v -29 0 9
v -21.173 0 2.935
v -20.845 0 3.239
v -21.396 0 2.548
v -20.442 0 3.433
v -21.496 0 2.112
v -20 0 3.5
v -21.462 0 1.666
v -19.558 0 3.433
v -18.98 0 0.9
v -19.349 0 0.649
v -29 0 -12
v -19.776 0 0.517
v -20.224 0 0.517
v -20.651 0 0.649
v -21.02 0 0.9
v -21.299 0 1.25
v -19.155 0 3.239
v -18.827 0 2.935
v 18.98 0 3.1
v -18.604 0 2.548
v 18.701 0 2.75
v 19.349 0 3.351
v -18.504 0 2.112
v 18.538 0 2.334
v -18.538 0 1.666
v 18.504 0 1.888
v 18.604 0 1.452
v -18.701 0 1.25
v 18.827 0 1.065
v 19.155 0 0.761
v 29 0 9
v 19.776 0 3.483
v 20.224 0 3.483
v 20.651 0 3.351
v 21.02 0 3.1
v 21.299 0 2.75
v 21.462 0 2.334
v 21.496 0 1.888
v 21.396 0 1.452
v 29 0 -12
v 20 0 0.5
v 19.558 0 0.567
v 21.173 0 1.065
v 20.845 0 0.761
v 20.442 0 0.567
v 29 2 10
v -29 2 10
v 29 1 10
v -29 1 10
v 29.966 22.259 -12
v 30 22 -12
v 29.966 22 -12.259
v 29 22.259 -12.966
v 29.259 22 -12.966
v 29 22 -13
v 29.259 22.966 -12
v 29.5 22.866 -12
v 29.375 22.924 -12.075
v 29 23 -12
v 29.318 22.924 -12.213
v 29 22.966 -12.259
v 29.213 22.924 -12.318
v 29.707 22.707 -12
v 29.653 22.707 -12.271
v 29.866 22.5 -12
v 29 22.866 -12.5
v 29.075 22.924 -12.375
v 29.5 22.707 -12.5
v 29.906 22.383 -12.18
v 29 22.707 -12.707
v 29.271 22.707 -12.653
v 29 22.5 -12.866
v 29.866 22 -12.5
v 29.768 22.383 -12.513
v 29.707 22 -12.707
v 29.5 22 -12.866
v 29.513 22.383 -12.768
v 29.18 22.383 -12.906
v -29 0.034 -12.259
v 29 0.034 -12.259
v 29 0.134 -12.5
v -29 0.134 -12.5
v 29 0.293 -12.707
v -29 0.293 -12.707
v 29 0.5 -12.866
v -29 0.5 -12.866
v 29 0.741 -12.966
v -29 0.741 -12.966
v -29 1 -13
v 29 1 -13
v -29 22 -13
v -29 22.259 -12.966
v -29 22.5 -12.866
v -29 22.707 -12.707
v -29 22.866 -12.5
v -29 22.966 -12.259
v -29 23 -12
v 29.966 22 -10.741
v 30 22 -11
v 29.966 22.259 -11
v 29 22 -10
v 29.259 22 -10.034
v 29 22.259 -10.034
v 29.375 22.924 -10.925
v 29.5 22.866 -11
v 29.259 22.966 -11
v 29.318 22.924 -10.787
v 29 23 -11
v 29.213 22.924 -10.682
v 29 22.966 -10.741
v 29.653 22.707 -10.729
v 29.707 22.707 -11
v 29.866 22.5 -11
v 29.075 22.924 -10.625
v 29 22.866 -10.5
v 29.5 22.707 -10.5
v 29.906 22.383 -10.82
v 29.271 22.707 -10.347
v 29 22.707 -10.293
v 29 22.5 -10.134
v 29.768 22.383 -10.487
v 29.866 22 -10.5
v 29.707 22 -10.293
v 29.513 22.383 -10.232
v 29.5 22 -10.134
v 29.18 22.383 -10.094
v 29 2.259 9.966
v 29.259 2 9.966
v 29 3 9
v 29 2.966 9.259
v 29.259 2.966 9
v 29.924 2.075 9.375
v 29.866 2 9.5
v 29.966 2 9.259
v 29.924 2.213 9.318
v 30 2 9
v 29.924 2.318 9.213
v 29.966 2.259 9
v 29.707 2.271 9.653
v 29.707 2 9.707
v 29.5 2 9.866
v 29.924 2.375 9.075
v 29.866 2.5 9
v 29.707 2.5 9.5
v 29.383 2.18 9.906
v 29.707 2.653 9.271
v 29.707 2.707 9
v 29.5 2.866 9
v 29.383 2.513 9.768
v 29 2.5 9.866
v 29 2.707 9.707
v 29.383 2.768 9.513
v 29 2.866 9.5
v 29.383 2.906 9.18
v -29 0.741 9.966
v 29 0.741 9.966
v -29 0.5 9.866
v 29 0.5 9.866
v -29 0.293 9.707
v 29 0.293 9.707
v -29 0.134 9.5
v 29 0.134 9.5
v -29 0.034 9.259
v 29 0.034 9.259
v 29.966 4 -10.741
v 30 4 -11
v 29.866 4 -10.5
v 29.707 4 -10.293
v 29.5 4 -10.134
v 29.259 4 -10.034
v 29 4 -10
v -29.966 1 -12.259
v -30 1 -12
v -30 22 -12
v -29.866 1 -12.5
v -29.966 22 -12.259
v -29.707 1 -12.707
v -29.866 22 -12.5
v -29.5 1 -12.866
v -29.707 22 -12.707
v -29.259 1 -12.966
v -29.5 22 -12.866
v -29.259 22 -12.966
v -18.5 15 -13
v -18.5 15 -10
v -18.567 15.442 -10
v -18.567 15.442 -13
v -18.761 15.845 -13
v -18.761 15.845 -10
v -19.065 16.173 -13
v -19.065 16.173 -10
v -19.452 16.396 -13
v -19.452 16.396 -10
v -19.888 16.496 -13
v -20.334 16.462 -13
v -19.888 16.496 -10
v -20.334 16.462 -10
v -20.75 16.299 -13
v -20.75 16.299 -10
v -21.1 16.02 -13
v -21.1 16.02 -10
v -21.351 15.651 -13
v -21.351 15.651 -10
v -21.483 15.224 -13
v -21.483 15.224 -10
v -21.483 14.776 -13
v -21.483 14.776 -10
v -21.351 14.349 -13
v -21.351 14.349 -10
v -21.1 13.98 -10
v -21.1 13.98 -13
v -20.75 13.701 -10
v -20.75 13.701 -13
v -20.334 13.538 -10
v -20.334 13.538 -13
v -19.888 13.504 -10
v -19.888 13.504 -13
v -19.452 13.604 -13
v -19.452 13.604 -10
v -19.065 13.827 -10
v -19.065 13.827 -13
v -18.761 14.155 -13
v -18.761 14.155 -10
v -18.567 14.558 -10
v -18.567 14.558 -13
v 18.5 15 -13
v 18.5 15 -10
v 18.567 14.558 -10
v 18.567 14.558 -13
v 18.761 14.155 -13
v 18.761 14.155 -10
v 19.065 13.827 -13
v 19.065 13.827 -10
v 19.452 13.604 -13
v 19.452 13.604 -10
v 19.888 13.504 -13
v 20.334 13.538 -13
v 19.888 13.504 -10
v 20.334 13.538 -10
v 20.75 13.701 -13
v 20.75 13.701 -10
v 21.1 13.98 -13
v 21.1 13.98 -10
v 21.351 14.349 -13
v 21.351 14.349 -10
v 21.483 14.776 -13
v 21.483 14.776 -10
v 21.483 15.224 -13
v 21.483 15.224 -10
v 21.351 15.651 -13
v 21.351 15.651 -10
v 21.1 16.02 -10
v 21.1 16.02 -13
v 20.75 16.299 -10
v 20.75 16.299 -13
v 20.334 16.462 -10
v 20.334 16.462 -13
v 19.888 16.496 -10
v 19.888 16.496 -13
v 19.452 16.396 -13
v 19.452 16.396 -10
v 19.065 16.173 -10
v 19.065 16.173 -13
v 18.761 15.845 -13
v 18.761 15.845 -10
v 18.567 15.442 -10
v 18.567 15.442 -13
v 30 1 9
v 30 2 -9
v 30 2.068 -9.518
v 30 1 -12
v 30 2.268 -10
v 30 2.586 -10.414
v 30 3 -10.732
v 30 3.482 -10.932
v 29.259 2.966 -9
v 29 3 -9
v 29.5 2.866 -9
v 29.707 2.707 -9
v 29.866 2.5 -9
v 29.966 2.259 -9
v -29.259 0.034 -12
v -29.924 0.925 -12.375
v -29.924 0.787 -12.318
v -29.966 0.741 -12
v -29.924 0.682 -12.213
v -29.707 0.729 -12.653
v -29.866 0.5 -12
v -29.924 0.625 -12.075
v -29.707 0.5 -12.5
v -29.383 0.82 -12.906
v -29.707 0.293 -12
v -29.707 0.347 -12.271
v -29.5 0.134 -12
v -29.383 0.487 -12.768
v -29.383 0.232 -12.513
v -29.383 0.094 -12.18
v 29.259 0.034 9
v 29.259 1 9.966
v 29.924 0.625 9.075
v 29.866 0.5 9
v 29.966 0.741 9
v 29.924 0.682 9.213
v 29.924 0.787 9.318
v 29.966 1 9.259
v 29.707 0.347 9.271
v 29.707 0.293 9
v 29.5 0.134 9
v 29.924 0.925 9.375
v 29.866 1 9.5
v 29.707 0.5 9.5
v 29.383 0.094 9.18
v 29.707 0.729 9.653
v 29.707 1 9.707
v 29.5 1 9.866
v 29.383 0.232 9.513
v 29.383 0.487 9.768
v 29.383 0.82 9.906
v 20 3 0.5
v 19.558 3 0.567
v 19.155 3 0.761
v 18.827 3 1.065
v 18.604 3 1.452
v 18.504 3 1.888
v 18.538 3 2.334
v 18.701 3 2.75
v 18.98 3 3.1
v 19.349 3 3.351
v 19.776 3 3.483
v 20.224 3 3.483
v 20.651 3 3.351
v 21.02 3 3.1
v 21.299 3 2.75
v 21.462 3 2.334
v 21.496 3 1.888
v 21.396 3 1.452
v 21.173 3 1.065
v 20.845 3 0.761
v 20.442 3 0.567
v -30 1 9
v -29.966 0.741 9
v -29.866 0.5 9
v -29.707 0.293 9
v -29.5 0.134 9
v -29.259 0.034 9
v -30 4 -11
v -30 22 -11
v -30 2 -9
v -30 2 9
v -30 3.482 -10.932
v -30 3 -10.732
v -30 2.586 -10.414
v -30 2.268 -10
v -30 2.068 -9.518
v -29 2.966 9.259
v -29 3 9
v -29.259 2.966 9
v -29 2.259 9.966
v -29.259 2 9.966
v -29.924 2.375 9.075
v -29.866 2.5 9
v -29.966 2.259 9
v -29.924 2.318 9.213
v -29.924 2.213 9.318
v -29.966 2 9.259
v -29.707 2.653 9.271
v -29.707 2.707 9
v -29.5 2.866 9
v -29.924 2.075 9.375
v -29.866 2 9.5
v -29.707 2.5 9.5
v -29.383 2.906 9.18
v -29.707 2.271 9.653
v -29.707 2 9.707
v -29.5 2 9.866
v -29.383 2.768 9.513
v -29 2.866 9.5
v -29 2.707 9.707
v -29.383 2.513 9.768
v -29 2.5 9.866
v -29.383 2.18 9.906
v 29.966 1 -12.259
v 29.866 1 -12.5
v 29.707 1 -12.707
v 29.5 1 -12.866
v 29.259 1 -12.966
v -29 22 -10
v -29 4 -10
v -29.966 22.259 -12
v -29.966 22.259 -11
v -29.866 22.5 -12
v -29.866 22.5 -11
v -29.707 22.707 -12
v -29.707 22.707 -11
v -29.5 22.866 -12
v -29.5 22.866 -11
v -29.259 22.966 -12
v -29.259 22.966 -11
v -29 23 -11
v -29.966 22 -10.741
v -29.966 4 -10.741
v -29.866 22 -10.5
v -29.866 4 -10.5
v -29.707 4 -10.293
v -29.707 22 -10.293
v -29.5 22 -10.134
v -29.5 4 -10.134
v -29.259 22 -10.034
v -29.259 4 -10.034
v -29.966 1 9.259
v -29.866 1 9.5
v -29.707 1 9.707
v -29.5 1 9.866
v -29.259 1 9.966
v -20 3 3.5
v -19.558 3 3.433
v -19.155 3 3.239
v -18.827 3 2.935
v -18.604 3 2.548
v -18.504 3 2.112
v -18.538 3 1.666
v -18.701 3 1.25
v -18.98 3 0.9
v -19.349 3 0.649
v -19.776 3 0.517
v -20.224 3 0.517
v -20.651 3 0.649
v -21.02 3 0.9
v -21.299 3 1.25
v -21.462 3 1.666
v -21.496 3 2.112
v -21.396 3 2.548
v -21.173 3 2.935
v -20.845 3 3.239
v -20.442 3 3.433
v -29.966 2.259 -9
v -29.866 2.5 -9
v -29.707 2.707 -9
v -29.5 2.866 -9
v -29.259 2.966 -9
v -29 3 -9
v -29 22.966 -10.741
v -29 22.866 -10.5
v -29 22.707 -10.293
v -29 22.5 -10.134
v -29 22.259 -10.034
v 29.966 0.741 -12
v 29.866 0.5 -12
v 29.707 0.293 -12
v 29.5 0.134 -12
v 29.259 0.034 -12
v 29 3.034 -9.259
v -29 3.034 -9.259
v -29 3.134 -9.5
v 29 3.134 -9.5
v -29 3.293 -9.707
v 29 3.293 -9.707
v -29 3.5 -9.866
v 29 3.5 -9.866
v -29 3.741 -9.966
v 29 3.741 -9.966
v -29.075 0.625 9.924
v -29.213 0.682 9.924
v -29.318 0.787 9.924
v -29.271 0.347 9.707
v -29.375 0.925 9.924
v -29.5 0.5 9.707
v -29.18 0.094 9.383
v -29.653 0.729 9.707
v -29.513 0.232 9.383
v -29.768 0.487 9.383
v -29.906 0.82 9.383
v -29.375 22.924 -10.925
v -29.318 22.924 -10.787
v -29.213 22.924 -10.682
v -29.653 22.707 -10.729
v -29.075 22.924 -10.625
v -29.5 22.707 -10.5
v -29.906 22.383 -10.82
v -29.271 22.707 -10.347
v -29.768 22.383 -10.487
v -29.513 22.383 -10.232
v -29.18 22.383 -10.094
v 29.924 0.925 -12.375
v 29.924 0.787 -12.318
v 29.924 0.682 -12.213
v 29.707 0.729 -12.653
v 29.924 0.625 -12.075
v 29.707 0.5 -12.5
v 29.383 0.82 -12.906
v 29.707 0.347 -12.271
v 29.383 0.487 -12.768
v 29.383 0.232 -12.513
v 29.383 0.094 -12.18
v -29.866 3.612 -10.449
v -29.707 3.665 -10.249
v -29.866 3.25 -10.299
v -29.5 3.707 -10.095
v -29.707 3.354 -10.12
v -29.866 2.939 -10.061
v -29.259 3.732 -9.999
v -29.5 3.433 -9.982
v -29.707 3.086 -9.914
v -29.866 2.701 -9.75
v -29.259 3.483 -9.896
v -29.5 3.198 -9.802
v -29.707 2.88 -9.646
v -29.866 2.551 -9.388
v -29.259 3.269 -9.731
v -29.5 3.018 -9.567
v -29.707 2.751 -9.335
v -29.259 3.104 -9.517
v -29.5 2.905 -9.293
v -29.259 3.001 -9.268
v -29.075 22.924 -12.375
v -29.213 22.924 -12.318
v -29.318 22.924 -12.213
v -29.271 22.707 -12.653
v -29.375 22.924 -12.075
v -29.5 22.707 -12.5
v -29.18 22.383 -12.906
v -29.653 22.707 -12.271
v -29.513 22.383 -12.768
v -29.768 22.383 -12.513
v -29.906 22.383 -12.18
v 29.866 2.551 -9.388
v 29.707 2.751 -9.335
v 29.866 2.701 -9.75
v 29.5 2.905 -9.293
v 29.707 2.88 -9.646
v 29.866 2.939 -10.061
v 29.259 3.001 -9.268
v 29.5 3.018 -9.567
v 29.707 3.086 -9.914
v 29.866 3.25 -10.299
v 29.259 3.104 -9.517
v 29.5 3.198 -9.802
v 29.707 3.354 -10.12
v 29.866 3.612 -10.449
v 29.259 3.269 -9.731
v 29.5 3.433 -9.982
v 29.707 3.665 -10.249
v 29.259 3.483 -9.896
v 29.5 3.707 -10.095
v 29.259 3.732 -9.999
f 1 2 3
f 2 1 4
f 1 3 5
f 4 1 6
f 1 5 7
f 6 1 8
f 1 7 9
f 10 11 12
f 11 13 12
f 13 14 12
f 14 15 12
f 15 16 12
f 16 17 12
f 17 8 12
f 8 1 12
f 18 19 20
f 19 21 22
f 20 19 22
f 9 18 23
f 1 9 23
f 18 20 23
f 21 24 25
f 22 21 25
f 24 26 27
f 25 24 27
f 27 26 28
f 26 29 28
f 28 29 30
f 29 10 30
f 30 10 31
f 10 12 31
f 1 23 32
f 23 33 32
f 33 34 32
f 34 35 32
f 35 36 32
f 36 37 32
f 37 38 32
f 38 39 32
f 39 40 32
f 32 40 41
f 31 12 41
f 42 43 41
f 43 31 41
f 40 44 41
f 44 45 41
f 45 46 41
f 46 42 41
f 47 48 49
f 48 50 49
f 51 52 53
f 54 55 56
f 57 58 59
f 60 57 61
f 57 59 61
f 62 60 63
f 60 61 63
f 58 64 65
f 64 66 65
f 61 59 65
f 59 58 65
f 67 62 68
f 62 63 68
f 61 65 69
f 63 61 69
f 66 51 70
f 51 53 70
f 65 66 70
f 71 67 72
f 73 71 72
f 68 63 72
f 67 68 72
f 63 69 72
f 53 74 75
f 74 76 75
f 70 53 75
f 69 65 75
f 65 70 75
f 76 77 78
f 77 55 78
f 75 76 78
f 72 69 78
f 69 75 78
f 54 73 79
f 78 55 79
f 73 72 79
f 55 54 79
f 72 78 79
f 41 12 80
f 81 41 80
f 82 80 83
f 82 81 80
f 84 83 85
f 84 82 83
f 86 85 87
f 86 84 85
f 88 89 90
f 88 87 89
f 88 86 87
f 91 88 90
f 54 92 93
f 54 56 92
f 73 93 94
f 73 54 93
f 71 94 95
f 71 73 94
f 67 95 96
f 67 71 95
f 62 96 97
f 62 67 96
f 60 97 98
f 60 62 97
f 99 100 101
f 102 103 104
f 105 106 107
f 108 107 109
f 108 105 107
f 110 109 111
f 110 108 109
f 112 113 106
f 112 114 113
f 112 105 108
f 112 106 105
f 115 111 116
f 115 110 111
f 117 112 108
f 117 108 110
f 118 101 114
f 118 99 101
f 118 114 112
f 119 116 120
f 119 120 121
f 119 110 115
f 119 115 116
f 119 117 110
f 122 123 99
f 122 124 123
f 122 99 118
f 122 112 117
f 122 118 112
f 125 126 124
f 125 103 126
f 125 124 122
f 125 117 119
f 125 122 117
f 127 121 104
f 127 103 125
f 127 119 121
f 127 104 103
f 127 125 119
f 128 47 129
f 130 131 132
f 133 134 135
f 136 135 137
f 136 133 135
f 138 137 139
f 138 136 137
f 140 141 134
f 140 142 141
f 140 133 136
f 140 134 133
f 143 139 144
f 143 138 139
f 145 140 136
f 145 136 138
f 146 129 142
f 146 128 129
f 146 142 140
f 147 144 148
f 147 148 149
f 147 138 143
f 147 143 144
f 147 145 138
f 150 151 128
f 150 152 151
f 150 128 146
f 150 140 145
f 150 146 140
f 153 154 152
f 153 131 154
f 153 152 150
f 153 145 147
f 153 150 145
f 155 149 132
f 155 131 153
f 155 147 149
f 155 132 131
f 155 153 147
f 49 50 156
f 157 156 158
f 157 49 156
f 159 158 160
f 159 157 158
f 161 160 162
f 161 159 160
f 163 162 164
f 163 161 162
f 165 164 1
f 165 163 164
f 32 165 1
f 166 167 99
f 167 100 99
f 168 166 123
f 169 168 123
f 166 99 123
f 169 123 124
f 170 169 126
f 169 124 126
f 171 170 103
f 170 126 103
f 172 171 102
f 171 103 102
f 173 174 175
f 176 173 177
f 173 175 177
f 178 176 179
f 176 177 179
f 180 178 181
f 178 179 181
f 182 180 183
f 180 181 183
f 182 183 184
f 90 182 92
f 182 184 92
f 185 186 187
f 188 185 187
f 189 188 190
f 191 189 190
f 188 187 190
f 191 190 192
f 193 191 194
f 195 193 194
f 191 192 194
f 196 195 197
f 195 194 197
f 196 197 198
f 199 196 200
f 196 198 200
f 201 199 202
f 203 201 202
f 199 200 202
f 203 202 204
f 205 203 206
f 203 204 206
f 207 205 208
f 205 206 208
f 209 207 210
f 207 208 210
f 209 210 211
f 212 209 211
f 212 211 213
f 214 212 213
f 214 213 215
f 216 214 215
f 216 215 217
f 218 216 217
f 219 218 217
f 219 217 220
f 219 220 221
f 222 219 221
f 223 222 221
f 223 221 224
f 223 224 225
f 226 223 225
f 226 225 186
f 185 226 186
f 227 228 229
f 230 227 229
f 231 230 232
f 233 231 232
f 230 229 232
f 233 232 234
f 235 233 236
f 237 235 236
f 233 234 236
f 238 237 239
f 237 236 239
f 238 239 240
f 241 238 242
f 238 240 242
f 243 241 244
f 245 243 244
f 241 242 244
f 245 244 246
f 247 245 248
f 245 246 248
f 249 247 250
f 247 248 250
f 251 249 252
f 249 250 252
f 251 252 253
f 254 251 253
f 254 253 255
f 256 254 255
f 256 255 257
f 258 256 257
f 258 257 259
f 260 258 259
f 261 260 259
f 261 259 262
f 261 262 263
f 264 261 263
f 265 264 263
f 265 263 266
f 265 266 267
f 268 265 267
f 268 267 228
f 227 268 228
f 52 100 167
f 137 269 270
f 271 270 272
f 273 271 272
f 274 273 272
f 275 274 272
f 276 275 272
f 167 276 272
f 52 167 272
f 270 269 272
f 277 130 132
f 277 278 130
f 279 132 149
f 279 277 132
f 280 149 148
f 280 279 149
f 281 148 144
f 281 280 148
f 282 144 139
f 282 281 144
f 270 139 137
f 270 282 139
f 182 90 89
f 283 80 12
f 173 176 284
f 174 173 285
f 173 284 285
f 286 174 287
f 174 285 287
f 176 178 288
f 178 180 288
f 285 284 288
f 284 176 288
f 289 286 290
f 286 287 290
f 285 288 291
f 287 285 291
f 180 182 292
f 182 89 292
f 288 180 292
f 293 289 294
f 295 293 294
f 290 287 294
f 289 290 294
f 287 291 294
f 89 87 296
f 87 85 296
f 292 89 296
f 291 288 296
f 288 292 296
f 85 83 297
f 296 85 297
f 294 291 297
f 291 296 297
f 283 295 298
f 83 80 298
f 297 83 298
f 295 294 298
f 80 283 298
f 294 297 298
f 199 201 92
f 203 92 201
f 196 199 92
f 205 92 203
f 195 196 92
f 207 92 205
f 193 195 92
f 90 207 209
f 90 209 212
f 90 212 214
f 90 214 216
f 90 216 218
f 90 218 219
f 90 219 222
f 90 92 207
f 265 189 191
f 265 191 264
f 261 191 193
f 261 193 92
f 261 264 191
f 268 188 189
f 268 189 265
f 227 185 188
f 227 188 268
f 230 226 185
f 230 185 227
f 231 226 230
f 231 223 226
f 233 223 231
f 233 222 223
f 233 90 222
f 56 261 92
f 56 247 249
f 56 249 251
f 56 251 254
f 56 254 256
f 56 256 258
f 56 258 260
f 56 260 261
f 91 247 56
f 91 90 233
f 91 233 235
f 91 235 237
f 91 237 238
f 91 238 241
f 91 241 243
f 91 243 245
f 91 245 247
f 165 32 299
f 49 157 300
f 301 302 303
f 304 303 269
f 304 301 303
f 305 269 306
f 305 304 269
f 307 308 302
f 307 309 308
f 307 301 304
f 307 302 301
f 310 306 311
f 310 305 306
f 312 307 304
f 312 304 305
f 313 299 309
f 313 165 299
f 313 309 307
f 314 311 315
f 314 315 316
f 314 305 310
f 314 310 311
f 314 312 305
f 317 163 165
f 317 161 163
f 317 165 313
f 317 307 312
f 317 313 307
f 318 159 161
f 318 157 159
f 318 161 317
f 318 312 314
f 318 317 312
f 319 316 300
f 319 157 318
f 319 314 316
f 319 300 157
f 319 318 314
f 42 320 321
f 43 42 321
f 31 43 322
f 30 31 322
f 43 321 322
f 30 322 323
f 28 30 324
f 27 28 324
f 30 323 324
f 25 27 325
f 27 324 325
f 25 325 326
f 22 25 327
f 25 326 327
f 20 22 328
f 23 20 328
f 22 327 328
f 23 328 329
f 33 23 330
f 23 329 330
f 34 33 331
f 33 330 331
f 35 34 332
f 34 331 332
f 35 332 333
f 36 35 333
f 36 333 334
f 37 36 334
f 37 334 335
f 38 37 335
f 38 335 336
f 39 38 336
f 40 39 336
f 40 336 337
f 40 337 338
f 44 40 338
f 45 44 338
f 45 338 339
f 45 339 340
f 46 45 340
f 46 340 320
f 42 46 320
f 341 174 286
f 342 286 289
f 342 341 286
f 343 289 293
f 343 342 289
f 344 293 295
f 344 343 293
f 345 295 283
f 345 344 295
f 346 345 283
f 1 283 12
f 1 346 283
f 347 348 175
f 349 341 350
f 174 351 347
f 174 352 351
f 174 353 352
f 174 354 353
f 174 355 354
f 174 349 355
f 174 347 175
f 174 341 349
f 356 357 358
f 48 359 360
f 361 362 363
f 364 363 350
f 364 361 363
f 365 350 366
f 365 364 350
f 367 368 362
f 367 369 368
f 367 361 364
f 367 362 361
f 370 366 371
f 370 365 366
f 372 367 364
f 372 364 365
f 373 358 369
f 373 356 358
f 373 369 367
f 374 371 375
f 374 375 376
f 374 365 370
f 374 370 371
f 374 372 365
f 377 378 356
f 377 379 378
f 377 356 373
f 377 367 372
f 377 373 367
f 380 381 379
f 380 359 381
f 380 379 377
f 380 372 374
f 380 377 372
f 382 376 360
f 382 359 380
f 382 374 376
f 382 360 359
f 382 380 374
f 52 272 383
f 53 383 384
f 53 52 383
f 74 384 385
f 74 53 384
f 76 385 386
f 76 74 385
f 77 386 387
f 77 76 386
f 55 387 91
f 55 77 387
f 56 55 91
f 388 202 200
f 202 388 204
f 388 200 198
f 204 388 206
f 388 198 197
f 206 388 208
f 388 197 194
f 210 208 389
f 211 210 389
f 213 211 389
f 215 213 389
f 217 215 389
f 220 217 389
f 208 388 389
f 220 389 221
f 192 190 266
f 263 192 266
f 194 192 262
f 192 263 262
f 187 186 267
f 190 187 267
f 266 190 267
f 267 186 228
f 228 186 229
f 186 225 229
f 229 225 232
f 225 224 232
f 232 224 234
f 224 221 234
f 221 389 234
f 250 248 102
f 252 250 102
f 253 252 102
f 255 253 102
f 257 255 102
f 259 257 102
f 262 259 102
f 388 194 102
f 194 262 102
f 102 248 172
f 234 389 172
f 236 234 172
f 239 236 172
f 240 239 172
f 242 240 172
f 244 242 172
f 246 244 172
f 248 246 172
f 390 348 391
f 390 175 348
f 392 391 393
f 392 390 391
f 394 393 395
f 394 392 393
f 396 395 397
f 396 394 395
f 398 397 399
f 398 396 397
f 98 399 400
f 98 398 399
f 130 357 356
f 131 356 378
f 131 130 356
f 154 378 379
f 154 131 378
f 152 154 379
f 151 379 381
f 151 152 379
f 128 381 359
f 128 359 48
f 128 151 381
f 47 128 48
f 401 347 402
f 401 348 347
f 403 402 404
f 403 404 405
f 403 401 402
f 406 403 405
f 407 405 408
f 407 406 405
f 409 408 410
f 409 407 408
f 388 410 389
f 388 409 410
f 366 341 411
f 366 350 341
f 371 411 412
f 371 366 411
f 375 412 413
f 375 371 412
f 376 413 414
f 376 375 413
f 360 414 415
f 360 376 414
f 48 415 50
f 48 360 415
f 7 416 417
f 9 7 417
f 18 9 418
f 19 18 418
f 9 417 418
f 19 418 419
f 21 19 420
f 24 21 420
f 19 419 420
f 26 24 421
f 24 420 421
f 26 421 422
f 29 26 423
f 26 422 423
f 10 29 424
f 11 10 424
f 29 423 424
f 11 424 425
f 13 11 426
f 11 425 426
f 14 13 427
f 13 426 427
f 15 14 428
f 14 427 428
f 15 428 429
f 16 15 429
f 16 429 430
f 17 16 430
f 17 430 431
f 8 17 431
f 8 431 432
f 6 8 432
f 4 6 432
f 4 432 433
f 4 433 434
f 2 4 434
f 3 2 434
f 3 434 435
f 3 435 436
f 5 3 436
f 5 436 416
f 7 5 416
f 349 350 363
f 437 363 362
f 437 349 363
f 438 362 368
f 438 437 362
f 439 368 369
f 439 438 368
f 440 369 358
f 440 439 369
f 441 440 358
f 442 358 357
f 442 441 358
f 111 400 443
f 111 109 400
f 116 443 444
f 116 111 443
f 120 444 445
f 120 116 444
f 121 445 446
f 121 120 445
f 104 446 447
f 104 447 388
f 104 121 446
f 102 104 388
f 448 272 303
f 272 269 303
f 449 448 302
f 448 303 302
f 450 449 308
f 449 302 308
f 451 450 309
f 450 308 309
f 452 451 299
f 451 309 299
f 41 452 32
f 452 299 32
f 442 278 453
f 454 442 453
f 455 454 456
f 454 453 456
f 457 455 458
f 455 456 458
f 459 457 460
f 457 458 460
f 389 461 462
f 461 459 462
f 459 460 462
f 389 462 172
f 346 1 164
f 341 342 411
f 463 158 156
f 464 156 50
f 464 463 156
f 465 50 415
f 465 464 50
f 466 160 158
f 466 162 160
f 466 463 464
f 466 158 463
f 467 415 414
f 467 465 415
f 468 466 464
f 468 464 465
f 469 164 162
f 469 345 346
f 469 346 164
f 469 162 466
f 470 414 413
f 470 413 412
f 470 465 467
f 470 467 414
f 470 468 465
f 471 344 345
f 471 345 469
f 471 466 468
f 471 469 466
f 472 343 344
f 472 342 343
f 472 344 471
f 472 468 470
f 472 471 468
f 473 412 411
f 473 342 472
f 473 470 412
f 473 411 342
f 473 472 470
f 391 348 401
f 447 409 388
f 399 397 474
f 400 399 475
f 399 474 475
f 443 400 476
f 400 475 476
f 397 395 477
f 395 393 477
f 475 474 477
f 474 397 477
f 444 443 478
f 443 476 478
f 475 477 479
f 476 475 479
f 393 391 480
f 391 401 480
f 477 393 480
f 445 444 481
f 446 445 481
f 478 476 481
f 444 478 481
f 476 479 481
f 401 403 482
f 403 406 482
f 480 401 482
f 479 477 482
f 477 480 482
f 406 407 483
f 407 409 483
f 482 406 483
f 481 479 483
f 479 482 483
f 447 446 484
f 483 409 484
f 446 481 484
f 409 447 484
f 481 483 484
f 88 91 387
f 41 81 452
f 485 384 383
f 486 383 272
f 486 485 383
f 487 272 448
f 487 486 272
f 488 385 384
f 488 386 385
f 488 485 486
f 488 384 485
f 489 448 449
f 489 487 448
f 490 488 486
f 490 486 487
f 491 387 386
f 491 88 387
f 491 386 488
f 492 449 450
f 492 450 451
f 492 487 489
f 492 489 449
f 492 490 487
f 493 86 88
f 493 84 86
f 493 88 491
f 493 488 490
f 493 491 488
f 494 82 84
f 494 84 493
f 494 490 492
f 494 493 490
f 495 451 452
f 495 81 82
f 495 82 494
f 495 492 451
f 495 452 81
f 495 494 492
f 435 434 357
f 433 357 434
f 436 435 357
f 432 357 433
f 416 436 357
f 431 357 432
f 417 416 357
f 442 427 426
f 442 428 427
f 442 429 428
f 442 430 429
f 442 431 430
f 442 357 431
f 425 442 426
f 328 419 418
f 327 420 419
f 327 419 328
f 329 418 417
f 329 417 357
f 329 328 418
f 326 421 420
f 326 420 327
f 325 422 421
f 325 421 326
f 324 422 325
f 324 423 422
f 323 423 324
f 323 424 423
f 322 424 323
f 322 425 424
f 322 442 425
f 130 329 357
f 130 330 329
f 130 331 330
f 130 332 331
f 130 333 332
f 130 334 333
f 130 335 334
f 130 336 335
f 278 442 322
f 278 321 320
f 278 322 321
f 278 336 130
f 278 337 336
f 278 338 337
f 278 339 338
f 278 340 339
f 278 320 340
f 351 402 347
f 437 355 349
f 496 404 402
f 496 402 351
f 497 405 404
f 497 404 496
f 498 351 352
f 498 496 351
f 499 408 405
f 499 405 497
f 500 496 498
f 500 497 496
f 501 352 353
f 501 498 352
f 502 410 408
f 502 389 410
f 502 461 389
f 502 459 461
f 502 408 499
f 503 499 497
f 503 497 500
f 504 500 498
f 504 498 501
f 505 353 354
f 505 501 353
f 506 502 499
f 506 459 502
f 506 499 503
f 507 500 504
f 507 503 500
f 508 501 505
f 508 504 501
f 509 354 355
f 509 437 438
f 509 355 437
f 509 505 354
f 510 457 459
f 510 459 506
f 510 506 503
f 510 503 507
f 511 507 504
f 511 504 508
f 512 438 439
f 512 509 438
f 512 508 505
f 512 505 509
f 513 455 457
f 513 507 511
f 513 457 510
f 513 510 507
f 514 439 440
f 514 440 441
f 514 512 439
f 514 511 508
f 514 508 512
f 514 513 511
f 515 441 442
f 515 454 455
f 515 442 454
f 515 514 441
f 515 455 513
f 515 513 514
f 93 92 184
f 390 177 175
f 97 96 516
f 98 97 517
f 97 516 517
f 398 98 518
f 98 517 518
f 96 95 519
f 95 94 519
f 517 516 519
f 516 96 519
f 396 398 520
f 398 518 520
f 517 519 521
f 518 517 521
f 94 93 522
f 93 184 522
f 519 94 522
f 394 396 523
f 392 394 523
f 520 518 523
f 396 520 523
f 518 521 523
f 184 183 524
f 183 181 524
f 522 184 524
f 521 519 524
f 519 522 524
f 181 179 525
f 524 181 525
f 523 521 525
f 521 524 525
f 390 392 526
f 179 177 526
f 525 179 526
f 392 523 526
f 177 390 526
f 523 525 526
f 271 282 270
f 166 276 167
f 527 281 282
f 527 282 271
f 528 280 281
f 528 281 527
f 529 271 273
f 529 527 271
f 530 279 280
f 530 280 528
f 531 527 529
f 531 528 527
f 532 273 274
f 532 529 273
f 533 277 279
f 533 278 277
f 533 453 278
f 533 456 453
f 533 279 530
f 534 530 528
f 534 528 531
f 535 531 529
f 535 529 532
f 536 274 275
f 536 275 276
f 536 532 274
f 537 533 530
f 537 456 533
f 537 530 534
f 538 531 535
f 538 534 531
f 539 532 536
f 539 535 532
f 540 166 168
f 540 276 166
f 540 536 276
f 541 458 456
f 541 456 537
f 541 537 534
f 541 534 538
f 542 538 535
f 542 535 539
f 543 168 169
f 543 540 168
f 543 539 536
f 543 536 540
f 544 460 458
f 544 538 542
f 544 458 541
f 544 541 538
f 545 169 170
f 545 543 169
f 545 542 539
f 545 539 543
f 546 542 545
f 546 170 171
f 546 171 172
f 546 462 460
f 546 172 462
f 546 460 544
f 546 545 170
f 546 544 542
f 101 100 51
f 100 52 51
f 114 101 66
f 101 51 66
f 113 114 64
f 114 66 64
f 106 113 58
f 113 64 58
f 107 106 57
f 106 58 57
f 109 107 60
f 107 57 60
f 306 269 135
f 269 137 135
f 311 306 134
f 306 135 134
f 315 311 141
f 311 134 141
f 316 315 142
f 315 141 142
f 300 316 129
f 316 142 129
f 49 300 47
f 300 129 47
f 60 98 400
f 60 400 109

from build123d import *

# Parameters (mm, degrees)
SKETCH1_W           = 60
SKETCH1_H           = 20
BOSS_EXTRUDE1_DEPTH = 3
SKETCH3_W           = 60
SKETCH3_H           = 3
BOSS_EXTRUDE2_DEPTH = 23
FILLET2_R           = 1
SKETCH4_R           = 1.5
CUT_EXTRUDE1_DEPTH  = 39.327535793
SKETCH6_R           = 1.5
CUT_EXTRUDE2_DEPTH  = 43.766809561


with BuildPart() as part:
    # Sketch1 → Boss-Extrude1 (new body)
    with BuildSketch(Plane(origin=(0, 0, 0), x_dir=(1, 0, 0), z_dir=(0, 1, 0))):
        Rectangle(SKETCH1_W, SKETCH1_H)
    extrude(amount=BOSS_EXTRUDE1_DEPTH)

    # Sketch3 → Boss-Extrude2 (add)
    with BuildSketch(Plane(origin=(0, 0, 0), x_dir=(1, 0, 0), z_dir=(0, 1, 0))):
        with Locations((0, 11.5)):
            Rectangle(SKETCH3_W, SKETCH3_H)
    extrude(amount=BOSS_EXTRUDE2_DEPTH)

    # Fillet2
    fillet2_edges = [part.edges().sort_by_distance(p)[0] for p in [
        (0, 3, 10),
        (-30, 13, -10),
        (30, 13, -10),
        (0, 0, -13),
        (30, 11.5, -13),
        (-30, 11.5, -13),
        (30, 23, -11.5),
        (0, 23, -13),
        (-30, 3, 0),
        (-30, 23, -11.5),
        (0, 23, -10),
        (0, 3, -10),
        (-30, 0, -1.5),
        (0, 0, 10),
        (30, 0, -1.5),
        (-30, 1.5, 10),
        (30, 1.5, 10),
        (30, 3, 0),
    ]]
    fillet(fillet2_edges, radius=FILLET2_R)

    # Sketch4 → Cut-Extrude1 (cut, through all)
    with BuildSketch(Plane(origin=(0, 3, 0), x_dir=(1, 0, 0), z_dir=(0, 1, 0))):
        with Locations(Location((-20, -2, 0), (0, 0, 270))):
            Circle(SKETCH4_R)
        with Locations(Location((20, -2, 0), (0, 0, 90))):
            Circle(SKETCH4_R)
    extrude(amount=-CUT_EXTRUDE1_DEPTH, mode=Mode.SUBTRACT)

    # Sketch6 → Cut-Extrude2 (cut, through all)
    with BuildSketch(Plane.XY.offset(-10)):
        with Locations((-20, 15)):
            Circle(SKETCH6_R)
        with Locations(Location((20, 15, 0), (0, 0, 180))):
            Circle(SKETCH6_R)
    extrude(amount=-CUT_EXTRUDE2_DEPTH, mode=Mode.SUBTRACT)


solid = part.part
